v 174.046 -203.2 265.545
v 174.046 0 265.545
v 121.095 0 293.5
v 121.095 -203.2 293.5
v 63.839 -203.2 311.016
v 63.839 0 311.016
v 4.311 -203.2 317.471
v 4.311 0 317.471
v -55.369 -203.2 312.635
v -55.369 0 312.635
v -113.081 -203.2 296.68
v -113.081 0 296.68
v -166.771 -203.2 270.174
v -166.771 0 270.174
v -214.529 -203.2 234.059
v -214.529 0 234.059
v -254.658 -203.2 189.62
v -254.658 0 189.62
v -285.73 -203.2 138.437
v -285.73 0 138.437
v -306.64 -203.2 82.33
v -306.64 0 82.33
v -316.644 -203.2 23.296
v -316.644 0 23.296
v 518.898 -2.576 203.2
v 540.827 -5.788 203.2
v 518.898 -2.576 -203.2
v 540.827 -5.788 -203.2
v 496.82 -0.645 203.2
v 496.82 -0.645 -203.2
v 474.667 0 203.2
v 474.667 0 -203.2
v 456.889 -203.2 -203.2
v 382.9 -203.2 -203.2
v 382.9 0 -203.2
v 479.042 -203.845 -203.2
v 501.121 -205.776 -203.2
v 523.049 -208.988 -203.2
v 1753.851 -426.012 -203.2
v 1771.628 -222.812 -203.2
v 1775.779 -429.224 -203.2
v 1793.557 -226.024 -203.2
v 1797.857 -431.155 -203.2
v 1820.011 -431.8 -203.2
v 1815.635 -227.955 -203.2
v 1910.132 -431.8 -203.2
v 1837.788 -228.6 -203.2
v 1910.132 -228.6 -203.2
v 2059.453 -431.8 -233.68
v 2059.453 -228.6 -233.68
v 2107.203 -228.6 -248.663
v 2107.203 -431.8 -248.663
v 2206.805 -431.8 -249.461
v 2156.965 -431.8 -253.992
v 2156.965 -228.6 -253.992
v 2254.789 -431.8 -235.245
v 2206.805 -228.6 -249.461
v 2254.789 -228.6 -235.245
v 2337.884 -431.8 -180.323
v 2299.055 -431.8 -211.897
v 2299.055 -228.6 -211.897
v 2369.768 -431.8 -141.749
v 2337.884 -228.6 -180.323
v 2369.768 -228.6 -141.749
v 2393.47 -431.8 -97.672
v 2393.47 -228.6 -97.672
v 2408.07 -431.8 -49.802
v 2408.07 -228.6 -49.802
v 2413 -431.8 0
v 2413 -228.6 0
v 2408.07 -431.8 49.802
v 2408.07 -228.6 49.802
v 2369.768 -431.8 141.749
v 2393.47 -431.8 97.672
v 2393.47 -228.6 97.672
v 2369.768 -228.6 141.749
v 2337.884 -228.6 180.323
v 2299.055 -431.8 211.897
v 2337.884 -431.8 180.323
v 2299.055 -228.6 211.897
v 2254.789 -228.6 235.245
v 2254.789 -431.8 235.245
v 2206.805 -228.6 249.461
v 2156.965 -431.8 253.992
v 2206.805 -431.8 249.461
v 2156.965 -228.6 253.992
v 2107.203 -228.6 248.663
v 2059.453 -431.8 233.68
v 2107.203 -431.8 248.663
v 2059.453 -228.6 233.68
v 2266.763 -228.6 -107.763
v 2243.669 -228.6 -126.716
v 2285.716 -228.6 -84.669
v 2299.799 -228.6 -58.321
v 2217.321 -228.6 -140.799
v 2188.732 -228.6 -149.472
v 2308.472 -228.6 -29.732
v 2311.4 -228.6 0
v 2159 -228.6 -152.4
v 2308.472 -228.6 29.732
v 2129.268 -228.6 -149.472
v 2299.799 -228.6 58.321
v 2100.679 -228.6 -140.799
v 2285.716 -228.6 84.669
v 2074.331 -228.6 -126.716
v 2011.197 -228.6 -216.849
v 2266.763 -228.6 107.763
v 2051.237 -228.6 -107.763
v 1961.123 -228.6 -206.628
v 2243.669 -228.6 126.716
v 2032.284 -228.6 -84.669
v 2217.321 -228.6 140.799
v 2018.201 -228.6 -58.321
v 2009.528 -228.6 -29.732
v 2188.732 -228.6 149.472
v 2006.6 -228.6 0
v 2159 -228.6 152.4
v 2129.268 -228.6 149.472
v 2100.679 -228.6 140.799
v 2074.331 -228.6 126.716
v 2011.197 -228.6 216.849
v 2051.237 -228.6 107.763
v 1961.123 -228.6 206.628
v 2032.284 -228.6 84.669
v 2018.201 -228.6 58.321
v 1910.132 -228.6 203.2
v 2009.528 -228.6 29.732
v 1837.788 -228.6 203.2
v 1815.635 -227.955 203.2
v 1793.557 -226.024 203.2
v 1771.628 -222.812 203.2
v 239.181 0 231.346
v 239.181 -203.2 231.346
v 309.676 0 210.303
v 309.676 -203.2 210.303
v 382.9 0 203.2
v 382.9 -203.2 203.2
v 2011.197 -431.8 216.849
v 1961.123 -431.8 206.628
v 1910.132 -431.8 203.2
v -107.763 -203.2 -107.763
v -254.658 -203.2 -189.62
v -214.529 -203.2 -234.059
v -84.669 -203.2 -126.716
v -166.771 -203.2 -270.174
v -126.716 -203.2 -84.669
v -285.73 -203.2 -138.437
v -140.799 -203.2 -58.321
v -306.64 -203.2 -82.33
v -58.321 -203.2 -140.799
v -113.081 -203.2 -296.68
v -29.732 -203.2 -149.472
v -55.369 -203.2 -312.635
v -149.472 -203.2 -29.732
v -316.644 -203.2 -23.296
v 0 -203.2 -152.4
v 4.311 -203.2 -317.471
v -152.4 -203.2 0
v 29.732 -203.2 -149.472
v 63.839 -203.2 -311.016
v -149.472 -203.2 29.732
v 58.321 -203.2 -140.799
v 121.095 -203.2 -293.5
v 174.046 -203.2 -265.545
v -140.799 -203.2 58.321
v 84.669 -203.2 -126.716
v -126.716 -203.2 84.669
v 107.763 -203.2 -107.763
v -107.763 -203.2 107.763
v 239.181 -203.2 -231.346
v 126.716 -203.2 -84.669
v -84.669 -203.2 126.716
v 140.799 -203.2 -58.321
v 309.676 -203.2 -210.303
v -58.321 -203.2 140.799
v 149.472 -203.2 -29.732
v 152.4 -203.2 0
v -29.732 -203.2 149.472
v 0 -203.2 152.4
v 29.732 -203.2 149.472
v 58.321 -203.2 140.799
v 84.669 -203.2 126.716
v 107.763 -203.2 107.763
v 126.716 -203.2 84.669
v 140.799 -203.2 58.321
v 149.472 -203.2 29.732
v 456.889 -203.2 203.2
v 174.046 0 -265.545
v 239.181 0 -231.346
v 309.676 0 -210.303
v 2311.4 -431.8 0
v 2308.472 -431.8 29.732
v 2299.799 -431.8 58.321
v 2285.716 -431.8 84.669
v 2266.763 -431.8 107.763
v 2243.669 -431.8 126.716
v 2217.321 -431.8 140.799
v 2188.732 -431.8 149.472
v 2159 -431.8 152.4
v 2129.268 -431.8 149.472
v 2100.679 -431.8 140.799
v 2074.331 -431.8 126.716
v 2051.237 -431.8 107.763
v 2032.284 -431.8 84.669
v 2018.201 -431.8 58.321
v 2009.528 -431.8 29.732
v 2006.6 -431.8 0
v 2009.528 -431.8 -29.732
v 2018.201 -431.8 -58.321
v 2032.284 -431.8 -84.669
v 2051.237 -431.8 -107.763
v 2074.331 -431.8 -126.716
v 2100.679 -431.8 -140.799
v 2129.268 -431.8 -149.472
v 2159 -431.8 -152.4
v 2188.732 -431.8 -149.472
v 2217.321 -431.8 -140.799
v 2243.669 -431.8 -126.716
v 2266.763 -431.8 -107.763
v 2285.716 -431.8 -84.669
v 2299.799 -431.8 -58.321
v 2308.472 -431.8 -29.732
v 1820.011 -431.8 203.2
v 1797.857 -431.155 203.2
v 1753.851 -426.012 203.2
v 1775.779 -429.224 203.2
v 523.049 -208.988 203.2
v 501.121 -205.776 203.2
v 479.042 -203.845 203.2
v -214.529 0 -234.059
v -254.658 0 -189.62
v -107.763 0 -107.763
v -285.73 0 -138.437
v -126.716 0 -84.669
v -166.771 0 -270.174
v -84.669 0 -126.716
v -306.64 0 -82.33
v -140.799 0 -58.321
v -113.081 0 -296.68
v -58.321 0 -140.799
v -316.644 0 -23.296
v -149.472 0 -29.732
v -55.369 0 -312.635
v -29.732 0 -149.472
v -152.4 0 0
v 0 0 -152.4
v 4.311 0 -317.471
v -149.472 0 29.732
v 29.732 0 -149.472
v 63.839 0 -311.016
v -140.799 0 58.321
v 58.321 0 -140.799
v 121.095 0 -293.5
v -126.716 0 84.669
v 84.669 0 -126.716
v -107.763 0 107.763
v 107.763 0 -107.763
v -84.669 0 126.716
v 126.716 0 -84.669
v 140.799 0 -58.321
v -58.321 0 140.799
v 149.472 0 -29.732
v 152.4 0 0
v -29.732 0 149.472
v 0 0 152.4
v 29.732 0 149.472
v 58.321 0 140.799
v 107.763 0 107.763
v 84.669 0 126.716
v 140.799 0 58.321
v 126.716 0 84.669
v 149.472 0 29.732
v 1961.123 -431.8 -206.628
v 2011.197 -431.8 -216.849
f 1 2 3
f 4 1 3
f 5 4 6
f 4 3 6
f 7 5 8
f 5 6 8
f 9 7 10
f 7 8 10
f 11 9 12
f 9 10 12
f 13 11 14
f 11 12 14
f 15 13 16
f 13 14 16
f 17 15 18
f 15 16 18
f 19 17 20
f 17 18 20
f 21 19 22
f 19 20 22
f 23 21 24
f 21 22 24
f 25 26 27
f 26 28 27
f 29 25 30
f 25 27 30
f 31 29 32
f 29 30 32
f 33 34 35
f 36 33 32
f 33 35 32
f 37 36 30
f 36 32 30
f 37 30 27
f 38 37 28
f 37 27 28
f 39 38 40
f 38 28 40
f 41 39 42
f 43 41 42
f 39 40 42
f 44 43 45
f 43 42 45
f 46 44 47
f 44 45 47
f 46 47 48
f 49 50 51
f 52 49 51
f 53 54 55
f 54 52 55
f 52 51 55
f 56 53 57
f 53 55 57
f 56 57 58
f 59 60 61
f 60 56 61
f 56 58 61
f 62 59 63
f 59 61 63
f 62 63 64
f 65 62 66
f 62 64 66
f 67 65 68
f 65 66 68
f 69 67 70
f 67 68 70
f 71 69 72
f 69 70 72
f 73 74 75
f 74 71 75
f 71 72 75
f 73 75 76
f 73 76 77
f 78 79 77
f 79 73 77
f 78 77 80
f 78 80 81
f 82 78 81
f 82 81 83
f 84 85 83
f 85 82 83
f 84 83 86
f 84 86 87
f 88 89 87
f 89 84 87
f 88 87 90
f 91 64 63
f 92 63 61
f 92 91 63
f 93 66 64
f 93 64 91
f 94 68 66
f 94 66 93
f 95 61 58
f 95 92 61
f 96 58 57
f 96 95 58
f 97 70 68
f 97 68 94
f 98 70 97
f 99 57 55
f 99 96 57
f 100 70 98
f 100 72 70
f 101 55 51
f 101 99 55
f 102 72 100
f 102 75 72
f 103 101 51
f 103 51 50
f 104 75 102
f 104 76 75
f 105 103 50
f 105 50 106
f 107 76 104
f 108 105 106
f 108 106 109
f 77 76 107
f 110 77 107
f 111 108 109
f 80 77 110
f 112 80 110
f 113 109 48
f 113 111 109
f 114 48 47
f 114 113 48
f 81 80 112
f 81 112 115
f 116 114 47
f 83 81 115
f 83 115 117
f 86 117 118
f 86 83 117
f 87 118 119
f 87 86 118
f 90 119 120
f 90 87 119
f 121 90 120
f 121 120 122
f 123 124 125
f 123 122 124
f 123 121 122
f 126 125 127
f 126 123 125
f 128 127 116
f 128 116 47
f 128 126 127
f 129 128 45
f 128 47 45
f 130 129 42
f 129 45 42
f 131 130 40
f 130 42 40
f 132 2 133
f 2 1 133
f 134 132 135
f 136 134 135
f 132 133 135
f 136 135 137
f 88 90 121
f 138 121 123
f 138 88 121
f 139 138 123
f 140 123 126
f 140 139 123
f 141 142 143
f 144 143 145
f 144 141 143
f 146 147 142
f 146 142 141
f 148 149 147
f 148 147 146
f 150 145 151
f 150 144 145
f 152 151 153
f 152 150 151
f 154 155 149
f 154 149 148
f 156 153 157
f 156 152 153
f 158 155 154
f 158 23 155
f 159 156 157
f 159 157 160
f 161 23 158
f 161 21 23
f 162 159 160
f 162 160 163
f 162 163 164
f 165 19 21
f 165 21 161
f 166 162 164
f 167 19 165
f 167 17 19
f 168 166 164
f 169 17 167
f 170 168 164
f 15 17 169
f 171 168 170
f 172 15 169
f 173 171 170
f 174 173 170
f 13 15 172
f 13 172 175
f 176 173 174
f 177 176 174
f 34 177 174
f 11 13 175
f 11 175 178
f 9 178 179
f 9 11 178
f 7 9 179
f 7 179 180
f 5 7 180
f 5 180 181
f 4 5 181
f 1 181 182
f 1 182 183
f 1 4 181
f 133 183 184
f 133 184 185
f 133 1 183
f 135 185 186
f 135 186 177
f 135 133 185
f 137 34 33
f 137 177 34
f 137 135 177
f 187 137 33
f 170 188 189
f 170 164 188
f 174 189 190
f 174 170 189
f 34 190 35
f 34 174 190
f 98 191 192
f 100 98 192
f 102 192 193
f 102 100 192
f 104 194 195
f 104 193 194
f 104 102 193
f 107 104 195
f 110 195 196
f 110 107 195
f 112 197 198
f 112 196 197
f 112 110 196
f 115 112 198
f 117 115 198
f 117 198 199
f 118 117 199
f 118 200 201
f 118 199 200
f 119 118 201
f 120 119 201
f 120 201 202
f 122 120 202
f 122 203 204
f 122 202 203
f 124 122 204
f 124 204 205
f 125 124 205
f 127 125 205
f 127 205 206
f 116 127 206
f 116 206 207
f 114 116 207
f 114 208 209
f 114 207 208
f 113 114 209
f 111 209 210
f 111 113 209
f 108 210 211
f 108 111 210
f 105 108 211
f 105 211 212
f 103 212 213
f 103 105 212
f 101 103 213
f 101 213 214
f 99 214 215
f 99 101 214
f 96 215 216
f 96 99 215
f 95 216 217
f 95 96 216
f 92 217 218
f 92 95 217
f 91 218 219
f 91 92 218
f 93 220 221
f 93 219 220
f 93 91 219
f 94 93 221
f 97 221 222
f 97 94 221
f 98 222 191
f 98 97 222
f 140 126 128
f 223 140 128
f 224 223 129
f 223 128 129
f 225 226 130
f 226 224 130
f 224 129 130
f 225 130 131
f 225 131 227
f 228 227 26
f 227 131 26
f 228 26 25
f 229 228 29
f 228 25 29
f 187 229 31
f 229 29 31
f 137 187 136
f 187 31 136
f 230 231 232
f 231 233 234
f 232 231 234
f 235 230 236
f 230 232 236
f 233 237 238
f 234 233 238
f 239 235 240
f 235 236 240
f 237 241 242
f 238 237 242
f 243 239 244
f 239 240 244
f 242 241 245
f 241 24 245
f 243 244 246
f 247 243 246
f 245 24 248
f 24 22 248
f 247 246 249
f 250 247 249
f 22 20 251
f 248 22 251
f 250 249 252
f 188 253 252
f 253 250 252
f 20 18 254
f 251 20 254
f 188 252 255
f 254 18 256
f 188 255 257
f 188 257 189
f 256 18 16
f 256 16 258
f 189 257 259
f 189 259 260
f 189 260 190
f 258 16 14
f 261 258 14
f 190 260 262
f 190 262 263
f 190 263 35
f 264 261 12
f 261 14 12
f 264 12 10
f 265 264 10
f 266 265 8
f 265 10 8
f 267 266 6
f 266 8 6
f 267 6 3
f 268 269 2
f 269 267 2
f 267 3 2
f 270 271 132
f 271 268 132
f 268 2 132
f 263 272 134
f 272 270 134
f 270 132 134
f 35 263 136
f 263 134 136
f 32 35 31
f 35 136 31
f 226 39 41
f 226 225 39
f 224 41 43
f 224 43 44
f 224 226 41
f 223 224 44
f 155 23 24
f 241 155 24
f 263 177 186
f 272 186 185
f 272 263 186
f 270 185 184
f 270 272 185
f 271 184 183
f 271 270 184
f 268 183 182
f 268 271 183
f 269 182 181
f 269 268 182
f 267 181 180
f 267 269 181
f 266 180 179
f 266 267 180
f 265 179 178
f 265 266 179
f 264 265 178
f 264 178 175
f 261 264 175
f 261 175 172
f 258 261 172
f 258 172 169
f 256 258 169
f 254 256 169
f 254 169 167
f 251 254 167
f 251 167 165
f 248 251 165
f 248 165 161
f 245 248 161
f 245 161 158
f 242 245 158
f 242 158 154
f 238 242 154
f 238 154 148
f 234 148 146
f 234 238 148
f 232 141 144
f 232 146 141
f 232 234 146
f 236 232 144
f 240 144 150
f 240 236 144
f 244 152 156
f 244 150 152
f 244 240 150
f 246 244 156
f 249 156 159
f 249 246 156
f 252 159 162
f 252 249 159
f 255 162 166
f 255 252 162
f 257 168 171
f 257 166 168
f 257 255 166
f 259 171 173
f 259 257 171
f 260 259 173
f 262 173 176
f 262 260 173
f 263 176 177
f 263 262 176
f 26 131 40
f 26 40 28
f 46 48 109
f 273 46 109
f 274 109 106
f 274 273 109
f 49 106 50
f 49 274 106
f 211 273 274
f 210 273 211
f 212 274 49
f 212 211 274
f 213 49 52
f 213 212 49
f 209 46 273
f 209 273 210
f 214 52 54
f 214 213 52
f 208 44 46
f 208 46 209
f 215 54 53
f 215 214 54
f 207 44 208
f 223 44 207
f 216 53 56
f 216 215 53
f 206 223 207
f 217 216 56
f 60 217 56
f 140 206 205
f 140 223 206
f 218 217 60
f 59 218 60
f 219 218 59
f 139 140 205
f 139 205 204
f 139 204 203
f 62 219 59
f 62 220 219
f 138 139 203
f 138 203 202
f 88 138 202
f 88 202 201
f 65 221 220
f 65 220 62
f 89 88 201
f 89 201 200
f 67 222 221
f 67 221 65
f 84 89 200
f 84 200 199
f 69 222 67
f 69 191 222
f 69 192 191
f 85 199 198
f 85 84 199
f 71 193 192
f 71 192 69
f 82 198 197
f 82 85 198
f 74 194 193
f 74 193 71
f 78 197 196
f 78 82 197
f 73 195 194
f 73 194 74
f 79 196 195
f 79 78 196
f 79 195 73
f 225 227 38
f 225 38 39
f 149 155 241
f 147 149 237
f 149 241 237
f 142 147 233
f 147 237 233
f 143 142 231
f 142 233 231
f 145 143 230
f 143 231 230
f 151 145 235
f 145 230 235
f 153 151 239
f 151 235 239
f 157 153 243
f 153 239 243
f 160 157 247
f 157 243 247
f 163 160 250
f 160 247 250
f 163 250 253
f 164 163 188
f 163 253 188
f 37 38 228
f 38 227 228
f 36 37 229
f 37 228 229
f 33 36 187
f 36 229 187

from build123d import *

# Parameters (mm, degrees)
F0_R     = 152.4
F1_DEPTH = 635
F2_W     = 560.6032549905
F2_H     = 203.2
F2_W_2   = 2.5960083008
F3_DEPTH = 317.5
F4_R     = 381


with BuildPart() as f1:
    # F0 (on Front) → F1 (new body)
    with BuildSketch(Plane.XZ):
        with BuildLine():
            ThreePointArc((243.9590334462, -203.2), (298.5491945385, -108.0491945385), (317.5, 0))
            ThreePointArc((317.5, 0), (298.5491945385, 108.0491945385), (243.9590334462, 203.2))
            ThreePointArc((243.9590334462, 203.2), (-317.5, 0), (243.9590334462, -203.2))
        make_face()
        Circle(F0_R, mode=Mode.SUBTRACT)
        with BuildLine():
            ThreePointArc((243.9590334462, 203.2), (298.5491945385, 108.0491945385), (317.5, 0))
            ThreePointArc((317.5, 0), (298.5491945385, -108.0491945385), (243.9590334462, -203.2))
            Line((243.9590334462, -203.2), (2006.6, -203.2))
            ThreePointArc((2006.6, -203.2), (1905, 0), (2006.6, 203.2))
            Line((2006.6, 203.2), (243.9590334462, 203.2))
        make_face()
        with BuildLine():
            ThreePointArc((2413, 0), (2272.592253257, 227.184506514), (2006.6, 203.2))
            ThreePointArc((2006.6, 203.2), (1905, 0), (2006.6, -203.2))
            ThreePointArc((2006.6, -203.2), (2272.592253257, -227.184506514), (2413, 0))
        make_face()
        with Locations((2159, 0)):
            Circle(F0_R, mode=Mode.SUBTRACT)
    extrude(amount=F1_DEPTH)

    # F2 (on Top) → F3 (intersect, symmetric)
    with BuildSketch(Plane.XY):
        with Locations((-36.342594049, -101.6)):
            Rectangle(F2_W, F2_H)
        Polygon((508, 0), (243.9590334462, 0), (243.9590334462, -203.2), (490.2223035715, -203.2), (1786.6773275361, -431.8), (2413, -431.8), (2413, -228.6), (1804.4550239646, -228.6), align=None)
        with Locations((2414.2980041504, -330.2)):
            Rectangle(F2_W_2, F2_H)
    extrude(amount=F3_DEPTH, both=True, mode=Mode.INTERSECT)

    # F4
    f4_edges = [f1.edges().sort_by_distance(p)[0] for p in [
        (508, 0, 0),
        (1804.455024, -228.6, 0),
        (490.222304, -203.2, 0),
        (1786.677328, -431.8, 0),
        (243.959033, -101.6, 203.2),
        (2006.6, -330.2, 203.2),
        (2006.6, -330.2, -203.2),
        (243.959033, -101.6, -203.2),
    ]]
    fillet(f4_edges, radius=F4_R)


solid = f1.part
